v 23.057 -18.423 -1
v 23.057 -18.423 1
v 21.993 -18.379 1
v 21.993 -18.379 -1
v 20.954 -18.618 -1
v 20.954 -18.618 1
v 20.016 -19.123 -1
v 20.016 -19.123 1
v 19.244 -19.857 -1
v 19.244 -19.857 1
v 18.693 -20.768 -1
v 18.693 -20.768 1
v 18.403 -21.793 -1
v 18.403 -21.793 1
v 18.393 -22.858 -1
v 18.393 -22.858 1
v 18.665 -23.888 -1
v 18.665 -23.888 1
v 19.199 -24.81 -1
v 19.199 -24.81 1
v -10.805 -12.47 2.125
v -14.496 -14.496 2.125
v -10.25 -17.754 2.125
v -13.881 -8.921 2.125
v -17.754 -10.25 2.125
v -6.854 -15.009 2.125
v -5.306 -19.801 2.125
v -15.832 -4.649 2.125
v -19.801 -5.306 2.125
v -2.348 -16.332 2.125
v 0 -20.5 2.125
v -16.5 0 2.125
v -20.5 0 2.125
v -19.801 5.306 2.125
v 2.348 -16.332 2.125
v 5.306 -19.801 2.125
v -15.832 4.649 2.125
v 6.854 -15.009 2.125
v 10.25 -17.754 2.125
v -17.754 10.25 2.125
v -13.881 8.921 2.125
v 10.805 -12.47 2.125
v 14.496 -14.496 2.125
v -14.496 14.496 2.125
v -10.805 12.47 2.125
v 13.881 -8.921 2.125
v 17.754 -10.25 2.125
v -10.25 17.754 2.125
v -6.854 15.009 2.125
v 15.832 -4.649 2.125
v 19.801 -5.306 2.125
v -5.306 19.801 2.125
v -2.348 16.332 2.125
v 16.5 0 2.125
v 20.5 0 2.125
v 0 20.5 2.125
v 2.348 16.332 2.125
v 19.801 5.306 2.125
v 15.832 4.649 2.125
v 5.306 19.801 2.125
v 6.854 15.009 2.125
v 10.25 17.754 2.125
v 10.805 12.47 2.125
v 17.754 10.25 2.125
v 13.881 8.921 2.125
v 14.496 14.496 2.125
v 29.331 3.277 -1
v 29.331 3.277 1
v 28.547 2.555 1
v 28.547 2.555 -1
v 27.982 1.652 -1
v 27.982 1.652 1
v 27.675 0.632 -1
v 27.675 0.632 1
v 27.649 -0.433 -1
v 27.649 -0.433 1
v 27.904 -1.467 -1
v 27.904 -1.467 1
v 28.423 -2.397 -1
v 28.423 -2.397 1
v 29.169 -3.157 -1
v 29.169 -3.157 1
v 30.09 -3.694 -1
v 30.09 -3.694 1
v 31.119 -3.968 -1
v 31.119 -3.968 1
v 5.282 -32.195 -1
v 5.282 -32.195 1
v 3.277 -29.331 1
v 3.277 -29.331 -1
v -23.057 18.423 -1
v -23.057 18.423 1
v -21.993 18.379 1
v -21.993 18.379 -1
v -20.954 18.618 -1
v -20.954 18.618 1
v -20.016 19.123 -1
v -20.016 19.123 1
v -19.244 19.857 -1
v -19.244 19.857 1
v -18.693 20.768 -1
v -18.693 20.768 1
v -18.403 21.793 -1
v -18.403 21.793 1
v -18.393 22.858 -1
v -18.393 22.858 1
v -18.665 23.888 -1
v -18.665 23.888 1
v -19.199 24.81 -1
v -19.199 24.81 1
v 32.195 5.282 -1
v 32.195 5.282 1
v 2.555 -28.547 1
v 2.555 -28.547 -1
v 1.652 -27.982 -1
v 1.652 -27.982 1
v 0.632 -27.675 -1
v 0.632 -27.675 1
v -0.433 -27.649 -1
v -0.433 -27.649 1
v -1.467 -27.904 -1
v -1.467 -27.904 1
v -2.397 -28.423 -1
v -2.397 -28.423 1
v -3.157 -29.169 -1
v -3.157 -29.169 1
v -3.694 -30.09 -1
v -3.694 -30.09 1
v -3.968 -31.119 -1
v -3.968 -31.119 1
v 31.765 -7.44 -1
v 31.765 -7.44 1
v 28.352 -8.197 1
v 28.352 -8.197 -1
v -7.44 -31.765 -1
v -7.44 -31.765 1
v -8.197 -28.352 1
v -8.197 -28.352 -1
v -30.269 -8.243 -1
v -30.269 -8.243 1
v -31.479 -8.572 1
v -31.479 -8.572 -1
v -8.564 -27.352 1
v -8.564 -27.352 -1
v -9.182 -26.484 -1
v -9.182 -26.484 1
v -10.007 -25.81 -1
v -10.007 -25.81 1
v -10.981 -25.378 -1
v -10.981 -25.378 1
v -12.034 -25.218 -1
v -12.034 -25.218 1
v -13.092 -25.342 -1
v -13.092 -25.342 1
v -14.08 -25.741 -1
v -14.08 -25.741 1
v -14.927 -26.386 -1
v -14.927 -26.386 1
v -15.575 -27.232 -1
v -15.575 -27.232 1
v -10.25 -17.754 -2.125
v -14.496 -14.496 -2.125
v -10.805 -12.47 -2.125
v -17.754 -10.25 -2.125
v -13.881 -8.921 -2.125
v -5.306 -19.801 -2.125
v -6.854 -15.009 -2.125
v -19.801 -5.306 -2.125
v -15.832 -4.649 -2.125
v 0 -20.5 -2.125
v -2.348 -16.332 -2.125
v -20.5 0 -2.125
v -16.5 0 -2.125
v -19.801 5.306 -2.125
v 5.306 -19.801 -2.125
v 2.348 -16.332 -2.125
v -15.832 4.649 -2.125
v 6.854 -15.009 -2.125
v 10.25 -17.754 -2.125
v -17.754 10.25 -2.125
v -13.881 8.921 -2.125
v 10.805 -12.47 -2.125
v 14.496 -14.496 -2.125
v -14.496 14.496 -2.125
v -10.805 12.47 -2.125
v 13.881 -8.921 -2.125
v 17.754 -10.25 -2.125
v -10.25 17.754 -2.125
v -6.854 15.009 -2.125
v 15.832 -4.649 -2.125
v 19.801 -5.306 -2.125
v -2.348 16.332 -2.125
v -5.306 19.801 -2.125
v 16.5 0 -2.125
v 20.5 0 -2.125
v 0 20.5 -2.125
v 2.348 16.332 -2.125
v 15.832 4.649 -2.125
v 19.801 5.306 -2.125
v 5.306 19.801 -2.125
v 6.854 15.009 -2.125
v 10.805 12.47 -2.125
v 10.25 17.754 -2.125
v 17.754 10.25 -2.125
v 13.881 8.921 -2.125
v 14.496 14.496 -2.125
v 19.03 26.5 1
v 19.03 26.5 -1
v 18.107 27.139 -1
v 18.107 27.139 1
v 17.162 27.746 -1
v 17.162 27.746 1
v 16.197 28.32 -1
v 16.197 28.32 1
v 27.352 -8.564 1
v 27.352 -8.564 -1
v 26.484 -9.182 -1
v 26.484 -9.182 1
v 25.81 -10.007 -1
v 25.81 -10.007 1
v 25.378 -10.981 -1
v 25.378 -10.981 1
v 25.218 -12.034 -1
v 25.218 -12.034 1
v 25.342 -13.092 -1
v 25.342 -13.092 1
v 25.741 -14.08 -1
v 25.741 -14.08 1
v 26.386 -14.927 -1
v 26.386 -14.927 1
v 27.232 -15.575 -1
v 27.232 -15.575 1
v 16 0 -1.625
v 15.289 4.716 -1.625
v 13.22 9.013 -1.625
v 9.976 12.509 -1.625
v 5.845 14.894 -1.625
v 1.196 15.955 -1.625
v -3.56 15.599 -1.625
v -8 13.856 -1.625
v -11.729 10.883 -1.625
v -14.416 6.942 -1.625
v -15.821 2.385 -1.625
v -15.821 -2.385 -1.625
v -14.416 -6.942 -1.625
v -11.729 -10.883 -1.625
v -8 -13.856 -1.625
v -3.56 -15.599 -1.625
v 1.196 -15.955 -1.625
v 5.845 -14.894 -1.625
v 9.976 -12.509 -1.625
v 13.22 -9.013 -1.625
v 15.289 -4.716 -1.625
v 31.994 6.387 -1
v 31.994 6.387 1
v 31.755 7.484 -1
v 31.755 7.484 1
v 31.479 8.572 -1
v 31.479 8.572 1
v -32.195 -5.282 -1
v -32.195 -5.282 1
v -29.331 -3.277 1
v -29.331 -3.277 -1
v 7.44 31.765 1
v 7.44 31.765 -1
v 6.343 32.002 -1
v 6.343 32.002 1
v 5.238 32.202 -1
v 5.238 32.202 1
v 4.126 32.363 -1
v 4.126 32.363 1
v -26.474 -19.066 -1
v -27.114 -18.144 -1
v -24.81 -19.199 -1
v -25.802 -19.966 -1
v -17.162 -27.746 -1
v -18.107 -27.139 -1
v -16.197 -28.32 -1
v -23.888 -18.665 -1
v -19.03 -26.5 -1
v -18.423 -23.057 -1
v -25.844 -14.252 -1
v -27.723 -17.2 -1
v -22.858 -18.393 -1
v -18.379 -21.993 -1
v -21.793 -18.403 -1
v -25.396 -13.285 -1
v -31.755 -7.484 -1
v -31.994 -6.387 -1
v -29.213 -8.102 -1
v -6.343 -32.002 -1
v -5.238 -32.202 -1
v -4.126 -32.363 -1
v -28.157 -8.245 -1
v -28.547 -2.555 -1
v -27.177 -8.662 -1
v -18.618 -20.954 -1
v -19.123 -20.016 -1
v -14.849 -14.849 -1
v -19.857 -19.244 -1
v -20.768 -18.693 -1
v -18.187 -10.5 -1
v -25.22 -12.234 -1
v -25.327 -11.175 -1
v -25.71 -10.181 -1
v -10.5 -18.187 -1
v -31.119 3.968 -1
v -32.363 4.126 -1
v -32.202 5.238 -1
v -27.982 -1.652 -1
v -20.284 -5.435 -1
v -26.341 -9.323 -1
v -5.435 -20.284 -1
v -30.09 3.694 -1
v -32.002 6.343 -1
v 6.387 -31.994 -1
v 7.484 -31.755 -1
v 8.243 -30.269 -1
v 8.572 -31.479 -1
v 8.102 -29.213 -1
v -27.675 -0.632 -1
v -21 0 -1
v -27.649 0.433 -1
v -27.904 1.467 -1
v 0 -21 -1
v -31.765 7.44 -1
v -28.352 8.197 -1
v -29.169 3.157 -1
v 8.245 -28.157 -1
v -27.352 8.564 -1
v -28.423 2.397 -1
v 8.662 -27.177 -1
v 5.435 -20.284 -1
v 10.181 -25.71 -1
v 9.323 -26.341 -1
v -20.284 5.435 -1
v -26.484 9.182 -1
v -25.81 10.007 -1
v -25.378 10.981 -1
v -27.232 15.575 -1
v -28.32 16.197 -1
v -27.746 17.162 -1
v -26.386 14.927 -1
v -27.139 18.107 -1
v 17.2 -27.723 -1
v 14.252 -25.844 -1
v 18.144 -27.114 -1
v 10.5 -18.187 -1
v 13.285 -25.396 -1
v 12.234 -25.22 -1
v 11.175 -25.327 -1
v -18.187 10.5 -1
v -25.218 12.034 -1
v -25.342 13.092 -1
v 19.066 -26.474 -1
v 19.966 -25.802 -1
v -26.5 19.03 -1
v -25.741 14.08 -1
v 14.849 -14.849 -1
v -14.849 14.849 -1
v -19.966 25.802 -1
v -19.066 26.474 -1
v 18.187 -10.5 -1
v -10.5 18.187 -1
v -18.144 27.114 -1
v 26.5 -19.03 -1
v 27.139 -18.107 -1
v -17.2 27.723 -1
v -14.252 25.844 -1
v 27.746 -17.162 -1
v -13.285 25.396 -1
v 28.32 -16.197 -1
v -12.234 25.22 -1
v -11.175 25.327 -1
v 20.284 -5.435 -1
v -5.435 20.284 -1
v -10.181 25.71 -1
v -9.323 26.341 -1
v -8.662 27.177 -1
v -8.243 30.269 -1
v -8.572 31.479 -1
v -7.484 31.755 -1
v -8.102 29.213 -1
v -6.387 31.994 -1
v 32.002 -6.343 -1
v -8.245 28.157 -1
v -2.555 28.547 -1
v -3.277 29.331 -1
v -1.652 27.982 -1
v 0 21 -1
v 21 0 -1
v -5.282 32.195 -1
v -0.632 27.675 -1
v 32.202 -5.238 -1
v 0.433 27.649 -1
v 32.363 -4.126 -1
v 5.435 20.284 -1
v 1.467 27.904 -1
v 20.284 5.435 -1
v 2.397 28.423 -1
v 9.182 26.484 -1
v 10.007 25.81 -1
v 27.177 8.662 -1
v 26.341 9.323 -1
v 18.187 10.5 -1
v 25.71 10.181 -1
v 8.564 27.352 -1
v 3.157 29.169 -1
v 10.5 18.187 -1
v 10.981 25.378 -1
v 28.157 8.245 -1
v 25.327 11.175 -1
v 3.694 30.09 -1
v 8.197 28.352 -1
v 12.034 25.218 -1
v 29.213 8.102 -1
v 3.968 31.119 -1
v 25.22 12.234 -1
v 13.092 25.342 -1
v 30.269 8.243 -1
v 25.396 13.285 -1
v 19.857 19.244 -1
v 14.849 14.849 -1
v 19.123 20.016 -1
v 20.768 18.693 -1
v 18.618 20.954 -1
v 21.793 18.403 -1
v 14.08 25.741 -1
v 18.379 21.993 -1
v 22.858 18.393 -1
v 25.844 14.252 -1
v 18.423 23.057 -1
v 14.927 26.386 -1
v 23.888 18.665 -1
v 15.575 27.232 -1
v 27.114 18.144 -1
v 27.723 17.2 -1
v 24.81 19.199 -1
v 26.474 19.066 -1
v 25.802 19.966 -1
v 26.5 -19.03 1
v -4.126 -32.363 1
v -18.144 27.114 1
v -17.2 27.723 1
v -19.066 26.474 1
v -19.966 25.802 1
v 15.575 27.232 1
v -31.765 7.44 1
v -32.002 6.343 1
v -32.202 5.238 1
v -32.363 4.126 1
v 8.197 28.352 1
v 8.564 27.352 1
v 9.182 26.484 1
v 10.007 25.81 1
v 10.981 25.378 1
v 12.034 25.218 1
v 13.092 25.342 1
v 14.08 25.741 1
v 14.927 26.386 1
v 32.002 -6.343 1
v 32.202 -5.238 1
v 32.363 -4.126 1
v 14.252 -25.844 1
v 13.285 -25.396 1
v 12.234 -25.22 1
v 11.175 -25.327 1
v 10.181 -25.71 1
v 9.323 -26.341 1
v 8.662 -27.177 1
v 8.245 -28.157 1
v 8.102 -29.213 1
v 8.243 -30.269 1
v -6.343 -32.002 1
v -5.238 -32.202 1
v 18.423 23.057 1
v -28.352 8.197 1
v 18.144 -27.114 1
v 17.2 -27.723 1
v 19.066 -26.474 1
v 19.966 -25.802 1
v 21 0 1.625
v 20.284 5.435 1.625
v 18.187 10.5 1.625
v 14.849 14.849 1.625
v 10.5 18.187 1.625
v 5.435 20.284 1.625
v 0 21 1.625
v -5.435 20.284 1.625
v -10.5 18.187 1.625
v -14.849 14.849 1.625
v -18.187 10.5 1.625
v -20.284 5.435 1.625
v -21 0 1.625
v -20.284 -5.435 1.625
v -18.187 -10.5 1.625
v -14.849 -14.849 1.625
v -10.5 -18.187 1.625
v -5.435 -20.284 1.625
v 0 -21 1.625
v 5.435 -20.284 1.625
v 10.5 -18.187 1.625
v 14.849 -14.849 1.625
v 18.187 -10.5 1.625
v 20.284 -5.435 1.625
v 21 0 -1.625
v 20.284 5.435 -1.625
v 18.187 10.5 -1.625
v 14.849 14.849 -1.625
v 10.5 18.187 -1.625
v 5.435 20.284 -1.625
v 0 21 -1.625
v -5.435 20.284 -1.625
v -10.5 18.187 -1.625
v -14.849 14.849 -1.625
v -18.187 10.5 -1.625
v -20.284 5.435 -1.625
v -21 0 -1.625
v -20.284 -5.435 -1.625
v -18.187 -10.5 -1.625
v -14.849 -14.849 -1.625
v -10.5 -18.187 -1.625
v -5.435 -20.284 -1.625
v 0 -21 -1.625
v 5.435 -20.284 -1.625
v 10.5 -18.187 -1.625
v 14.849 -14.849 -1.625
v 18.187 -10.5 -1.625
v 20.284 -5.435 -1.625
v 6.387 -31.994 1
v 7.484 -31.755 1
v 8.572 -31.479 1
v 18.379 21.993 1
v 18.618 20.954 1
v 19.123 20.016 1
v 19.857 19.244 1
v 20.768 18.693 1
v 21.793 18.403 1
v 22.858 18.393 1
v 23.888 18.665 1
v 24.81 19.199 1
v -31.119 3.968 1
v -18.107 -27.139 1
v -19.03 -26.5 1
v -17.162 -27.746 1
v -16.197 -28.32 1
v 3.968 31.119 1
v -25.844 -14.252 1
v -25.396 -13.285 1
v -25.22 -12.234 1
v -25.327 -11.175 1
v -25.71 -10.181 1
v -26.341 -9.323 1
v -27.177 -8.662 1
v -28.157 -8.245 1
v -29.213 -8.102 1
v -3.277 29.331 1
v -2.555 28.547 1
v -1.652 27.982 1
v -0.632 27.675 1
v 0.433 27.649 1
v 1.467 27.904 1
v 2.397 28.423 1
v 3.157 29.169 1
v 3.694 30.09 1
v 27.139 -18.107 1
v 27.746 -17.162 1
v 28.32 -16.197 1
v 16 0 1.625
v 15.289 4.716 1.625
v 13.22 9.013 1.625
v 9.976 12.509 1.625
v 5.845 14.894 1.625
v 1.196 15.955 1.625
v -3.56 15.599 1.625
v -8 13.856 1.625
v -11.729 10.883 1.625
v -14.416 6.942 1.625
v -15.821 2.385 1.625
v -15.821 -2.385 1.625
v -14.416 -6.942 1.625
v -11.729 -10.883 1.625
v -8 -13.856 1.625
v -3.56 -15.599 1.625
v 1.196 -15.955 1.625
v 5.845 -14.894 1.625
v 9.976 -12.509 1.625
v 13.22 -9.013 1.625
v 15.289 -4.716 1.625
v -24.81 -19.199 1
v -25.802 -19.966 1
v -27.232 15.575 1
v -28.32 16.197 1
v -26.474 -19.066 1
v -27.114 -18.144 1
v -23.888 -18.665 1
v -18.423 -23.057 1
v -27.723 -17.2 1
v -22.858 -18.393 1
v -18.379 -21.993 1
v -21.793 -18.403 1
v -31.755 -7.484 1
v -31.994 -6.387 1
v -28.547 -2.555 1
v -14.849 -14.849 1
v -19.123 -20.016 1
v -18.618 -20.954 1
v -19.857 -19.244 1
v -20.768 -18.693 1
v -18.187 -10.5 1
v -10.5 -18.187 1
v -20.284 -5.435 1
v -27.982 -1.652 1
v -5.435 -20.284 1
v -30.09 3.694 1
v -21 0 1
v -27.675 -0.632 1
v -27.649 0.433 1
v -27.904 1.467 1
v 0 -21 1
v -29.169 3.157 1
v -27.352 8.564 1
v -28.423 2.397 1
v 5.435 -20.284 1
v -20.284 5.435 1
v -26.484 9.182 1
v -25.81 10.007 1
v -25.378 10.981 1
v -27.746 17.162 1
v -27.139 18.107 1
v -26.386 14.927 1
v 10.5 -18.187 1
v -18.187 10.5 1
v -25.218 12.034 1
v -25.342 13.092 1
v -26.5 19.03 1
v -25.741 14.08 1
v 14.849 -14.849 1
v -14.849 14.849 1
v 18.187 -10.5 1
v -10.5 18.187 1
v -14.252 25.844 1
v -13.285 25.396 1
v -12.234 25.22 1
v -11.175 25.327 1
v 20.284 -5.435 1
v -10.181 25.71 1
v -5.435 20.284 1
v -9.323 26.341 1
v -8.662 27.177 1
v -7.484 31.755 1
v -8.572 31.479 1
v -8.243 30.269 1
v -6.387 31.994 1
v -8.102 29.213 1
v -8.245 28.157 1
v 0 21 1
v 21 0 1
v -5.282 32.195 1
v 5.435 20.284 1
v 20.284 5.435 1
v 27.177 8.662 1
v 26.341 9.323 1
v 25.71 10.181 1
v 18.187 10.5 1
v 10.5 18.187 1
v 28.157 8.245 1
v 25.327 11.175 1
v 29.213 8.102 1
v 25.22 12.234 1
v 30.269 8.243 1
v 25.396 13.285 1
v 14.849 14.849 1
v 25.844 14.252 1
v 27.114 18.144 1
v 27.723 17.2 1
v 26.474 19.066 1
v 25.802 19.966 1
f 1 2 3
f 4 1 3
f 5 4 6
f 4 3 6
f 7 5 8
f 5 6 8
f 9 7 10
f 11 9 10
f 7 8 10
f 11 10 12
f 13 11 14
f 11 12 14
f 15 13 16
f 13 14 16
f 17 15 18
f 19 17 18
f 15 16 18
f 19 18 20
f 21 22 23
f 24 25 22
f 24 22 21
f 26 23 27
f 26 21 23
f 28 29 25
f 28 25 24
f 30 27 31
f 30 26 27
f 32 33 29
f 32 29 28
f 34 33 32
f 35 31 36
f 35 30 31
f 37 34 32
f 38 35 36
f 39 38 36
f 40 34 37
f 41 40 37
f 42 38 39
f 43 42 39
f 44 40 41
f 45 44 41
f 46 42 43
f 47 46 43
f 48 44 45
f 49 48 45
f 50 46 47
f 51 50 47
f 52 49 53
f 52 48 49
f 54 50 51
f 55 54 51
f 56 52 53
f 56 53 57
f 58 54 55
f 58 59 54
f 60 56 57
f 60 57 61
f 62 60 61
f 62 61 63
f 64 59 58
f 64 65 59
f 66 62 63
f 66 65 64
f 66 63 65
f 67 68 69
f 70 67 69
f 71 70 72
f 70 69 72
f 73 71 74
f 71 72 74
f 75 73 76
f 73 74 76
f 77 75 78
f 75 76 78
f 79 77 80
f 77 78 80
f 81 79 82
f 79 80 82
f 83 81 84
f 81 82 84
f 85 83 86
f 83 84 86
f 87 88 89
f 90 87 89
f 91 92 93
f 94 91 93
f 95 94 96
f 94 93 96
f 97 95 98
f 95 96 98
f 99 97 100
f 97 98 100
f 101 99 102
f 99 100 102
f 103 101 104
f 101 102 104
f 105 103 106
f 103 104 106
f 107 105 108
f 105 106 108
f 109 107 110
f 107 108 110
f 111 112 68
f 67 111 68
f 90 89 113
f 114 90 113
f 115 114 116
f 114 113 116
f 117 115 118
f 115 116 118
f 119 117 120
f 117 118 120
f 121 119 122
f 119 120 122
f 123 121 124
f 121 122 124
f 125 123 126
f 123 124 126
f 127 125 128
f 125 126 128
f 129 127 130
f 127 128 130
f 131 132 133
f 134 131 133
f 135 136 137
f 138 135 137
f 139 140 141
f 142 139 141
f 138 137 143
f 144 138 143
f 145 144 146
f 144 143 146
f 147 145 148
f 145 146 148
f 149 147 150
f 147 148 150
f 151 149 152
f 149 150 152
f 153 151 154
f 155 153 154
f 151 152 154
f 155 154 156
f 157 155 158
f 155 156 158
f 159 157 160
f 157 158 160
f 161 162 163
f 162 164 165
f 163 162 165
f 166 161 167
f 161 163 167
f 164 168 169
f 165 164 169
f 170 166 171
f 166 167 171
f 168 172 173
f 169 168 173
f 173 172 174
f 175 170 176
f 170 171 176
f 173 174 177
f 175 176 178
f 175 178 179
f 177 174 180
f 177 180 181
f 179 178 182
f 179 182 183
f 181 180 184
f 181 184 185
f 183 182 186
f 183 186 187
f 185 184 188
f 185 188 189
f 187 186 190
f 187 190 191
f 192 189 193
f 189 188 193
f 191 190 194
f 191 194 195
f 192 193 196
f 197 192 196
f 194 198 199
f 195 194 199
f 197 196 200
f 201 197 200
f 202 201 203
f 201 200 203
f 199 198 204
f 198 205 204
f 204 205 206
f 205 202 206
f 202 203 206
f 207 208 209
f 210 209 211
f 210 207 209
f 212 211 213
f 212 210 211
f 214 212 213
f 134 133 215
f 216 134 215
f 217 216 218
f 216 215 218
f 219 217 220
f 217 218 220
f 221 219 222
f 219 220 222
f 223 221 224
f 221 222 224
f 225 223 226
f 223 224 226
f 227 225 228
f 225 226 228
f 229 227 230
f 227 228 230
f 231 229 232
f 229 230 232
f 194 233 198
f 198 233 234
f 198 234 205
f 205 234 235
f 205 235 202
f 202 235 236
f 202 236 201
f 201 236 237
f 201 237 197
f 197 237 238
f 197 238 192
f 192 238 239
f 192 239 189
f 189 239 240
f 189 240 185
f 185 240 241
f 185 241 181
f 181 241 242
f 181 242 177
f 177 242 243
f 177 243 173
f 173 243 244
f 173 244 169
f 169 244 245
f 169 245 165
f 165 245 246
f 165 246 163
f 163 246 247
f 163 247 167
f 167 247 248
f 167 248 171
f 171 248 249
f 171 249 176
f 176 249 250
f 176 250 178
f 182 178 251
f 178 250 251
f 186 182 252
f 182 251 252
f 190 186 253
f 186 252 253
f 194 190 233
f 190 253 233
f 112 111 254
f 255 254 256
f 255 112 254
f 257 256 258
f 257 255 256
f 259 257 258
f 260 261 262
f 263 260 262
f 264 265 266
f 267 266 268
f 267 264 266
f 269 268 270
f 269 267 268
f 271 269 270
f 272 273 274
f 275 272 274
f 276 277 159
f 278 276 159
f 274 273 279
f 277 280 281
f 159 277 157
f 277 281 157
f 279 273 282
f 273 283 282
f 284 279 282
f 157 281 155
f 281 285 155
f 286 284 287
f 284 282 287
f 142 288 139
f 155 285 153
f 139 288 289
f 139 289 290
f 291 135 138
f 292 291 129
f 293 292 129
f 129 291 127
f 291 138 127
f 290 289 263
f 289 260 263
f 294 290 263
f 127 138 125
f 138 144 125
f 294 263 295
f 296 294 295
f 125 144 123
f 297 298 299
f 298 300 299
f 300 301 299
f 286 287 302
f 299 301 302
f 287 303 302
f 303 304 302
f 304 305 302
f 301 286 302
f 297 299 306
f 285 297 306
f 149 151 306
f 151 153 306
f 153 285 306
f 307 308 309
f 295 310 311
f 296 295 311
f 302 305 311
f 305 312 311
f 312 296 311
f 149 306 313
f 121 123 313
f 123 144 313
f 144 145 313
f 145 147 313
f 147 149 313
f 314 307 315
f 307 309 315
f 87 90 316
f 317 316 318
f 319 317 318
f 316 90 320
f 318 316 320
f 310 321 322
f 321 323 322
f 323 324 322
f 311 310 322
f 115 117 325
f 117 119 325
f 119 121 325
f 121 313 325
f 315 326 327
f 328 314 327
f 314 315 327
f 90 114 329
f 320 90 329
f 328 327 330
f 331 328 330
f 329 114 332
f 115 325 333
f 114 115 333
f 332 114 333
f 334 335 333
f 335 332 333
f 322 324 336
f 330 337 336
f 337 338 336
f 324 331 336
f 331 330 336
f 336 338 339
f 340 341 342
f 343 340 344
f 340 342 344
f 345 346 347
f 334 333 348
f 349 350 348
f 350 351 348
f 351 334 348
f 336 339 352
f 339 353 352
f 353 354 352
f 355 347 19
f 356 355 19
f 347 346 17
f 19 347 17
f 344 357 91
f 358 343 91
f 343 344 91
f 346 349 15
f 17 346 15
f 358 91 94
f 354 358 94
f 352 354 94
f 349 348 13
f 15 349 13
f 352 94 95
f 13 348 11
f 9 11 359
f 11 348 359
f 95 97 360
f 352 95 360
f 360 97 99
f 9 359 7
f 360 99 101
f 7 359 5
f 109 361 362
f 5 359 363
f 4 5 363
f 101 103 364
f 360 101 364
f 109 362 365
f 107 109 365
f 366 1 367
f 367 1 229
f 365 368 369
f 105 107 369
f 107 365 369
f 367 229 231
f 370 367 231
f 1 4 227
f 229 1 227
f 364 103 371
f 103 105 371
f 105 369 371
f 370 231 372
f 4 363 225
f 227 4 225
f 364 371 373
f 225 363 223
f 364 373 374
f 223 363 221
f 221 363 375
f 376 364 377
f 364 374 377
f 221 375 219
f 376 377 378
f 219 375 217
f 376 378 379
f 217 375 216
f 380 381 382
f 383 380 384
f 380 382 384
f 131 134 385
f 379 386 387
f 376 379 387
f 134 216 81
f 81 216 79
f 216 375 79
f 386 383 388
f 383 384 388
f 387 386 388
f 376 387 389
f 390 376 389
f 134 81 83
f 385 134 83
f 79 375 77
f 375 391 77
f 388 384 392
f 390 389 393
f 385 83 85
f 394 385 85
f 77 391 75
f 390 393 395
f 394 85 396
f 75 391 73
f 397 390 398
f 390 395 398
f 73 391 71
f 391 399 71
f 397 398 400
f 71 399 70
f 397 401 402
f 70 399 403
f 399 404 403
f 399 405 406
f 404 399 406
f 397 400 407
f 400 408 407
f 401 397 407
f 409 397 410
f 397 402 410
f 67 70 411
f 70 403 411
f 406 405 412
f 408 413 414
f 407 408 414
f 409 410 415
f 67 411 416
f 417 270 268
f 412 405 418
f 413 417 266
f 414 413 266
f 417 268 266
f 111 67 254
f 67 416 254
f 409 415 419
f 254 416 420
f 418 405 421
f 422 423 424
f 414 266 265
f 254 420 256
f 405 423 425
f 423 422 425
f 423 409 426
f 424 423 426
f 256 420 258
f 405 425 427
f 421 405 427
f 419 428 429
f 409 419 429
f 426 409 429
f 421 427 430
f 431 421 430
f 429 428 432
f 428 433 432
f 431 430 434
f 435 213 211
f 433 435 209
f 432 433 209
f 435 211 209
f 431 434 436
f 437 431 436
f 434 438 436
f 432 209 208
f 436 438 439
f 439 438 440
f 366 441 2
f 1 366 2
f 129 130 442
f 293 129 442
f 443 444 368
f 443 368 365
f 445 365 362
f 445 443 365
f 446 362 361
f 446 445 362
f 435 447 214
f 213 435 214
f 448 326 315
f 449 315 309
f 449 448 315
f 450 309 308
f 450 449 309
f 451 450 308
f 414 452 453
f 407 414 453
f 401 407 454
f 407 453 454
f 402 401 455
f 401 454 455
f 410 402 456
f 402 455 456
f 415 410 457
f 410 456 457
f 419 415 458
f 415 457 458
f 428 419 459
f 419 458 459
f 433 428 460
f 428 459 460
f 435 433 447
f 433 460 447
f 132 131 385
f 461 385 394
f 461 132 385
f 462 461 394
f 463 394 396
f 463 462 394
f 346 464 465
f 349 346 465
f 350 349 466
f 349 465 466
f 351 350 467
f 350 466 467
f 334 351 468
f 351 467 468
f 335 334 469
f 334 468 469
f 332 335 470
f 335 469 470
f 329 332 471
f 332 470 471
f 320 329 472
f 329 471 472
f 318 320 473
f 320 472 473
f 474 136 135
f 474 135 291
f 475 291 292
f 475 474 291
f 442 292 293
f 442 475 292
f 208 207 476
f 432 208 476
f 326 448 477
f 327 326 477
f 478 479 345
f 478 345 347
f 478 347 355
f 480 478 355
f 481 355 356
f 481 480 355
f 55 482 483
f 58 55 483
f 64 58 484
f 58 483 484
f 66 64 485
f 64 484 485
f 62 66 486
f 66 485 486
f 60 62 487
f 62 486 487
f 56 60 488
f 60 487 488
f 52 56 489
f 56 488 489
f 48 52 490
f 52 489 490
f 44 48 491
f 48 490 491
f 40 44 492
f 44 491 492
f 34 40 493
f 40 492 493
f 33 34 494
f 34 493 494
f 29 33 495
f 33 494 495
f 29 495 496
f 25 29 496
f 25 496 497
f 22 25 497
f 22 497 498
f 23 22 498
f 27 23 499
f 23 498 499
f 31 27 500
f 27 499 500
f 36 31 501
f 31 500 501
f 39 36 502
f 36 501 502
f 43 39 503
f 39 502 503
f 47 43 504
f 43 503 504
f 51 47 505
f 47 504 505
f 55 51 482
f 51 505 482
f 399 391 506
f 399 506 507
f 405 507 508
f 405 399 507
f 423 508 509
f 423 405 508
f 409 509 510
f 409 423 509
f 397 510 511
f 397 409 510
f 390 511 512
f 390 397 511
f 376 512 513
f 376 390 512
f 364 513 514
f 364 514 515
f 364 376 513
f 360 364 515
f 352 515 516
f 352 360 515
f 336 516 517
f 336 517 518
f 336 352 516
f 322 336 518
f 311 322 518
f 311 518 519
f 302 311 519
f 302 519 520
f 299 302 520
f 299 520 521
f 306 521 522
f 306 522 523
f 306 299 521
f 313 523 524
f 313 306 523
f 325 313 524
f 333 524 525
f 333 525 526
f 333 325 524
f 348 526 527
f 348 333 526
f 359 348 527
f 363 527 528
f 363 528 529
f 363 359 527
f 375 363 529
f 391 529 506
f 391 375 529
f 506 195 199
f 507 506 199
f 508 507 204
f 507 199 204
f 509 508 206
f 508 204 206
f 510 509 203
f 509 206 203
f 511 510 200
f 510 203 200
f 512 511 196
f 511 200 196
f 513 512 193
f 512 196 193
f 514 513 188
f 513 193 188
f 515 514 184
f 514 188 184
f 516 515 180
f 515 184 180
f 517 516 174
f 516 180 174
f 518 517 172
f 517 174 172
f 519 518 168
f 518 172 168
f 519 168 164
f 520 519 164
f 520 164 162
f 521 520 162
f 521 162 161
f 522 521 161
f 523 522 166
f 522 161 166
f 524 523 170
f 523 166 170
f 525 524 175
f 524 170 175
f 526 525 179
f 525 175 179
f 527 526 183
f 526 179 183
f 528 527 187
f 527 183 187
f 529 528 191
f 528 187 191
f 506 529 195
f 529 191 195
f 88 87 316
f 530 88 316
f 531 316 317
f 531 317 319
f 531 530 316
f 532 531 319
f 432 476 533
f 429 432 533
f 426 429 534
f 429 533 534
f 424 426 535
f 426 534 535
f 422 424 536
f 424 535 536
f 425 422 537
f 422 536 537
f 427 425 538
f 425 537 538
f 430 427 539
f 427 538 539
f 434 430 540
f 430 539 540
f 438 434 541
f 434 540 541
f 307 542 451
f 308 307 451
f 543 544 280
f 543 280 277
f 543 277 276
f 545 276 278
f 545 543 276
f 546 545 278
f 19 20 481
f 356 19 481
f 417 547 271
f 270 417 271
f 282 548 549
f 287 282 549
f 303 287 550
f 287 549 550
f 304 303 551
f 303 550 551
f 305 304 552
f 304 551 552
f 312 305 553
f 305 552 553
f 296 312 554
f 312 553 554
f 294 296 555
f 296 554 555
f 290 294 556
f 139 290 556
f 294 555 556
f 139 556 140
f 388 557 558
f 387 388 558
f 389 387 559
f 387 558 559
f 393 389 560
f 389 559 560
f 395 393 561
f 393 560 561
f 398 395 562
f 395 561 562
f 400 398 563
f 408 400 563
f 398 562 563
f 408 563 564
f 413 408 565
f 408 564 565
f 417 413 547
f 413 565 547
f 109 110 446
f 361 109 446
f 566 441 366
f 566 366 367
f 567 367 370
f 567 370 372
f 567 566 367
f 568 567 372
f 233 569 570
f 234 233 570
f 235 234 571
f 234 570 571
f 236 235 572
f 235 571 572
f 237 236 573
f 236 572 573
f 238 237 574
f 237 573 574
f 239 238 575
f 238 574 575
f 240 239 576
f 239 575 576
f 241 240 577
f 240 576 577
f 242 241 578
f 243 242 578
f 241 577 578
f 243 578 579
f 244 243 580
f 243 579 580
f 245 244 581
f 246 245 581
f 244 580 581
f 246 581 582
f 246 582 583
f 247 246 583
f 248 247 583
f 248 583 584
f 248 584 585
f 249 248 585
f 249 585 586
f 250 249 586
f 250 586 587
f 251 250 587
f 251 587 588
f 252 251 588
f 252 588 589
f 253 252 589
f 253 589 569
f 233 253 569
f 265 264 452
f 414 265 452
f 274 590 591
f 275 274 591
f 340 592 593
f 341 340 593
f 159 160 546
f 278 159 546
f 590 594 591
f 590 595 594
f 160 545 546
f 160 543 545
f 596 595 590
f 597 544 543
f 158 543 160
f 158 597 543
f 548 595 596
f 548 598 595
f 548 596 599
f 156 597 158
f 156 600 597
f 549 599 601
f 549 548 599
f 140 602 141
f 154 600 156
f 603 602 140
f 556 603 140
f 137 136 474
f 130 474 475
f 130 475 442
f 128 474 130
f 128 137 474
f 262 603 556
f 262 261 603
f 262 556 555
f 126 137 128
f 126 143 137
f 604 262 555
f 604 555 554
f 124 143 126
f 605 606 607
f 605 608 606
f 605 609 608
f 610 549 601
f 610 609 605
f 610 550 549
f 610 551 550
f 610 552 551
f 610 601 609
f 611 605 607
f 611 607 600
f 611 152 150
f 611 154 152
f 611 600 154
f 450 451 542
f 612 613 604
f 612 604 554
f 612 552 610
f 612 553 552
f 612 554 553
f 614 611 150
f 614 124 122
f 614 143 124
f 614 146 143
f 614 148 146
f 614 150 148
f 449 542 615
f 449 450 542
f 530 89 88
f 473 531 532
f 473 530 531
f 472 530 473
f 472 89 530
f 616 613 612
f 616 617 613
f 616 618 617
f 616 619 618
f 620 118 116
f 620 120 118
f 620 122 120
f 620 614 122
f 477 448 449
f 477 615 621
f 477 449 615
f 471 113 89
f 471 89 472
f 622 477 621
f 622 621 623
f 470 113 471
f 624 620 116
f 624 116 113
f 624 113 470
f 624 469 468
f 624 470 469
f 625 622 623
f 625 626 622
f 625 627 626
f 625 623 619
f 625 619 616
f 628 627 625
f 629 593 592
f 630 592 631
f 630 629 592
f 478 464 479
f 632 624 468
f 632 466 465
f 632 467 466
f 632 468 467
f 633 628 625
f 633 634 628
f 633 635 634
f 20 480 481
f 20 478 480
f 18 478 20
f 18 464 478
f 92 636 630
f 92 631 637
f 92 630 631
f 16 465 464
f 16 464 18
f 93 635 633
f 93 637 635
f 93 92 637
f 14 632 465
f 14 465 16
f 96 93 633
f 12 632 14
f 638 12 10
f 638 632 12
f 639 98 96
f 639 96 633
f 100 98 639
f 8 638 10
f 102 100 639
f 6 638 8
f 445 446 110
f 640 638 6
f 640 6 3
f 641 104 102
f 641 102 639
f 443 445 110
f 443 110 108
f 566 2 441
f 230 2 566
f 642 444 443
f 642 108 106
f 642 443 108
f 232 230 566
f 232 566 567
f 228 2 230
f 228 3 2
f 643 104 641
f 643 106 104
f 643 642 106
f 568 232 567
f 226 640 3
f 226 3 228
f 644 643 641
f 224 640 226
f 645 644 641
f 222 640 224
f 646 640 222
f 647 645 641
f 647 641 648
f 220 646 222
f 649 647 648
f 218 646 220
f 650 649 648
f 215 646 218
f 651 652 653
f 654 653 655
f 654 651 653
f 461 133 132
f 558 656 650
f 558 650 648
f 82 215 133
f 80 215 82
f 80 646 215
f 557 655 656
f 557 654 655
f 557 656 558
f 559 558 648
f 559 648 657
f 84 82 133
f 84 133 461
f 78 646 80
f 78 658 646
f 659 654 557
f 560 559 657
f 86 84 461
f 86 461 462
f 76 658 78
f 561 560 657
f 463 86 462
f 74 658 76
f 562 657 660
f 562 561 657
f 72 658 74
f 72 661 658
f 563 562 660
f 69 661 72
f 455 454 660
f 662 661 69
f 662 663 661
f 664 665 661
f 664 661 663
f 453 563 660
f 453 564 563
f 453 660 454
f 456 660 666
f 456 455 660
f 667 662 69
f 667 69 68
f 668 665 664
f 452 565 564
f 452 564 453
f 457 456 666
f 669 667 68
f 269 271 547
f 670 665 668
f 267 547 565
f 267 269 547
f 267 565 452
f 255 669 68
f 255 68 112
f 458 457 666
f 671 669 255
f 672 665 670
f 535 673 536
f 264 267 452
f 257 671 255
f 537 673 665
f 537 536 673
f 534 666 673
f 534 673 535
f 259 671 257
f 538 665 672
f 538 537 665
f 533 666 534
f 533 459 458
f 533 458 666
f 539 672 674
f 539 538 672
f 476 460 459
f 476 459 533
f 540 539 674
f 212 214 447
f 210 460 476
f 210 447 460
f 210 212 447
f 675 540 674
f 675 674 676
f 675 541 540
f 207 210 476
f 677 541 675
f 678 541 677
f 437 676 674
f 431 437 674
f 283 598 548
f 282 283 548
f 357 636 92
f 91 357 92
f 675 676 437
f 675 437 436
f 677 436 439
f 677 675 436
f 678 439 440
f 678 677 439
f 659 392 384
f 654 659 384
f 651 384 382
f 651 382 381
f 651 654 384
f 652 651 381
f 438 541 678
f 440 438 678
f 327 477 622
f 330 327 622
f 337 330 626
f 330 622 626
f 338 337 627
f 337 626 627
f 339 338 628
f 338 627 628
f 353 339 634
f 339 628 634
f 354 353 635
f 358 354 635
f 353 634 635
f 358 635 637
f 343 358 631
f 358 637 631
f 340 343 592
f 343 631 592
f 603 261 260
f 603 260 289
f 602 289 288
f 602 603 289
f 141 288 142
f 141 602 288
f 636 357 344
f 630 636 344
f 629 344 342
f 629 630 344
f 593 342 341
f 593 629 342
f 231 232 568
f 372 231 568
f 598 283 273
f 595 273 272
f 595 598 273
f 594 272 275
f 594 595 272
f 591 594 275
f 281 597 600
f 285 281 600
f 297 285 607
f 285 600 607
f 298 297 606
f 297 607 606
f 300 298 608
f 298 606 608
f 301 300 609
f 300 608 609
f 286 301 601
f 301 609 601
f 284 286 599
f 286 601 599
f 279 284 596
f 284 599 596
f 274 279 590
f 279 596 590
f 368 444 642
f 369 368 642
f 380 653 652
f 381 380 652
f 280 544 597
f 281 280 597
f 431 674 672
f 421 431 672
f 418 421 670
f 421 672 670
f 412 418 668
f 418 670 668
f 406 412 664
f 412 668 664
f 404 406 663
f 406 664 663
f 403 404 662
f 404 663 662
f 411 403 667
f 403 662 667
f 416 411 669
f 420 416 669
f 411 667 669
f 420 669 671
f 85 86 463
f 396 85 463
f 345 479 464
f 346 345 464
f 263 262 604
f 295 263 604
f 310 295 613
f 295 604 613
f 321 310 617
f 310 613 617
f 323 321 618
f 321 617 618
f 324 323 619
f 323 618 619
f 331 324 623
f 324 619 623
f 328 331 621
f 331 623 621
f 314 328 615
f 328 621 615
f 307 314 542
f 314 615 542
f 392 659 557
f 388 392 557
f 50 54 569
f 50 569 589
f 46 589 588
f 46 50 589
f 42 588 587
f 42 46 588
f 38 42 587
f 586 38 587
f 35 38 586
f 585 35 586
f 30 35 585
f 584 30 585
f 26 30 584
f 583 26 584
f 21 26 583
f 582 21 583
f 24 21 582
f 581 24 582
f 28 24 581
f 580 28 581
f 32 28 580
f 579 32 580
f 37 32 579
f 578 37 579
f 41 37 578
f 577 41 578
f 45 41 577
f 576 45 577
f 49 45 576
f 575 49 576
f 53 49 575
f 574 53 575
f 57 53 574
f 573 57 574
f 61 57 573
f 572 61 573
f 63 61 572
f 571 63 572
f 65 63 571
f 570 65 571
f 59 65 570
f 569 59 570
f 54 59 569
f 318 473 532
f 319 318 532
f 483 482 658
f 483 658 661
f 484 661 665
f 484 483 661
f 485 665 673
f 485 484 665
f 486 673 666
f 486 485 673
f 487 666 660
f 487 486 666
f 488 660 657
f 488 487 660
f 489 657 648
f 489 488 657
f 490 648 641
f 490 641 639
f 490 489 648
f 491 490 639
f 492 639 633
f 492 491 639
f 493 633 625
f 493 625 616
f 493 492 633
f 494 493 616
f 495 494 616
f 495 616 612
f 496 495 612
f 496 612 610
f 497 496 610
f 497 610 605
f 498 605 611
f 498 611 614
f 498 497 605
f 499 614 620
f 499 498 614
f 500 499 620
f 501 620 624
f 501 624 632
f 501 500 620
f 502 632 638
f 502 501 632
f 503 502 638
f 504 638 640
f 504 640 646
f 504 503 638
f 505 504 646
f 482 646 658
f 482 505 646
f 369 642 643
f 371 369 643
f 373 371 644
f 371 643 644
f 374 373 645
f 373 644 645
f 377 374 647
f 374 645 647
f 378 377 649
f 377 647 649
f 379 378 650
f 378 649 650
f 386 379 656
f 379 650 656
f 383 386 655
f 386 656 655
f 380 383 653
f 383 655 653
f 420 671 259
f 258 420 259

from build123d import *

# Parameters (mm, degrees)
ESQUISSE1_R                  = 32.625
EXTRUSION1_DEPTH             = 1
ENL_V_MAT_EXTRU_1_DEPTH      = 2
R_P_TITION_CIRCULAIRE1_COUNT = 16
ESQUISSE3_R                  = 21
EXTRUSION2_DEPTH             = 2.125
ESQUISSE4_R                  = 16
ENL_V_MAT_EXTRU_2_DEPTH      = 3.125
ENL_V_MAT_EXTRU_2_DEPTH_BACK = 3.125
CHANFREIN1_SIZE              = 0.5


with BuildPart() as part:
    # Esquisse1 → Extrusion1 (new body, symmetric)
    with BuildSketch(Plane.XY):
        Circle(ESQUISSE1_R)
    extrude(amount=EXTRUSION1_DEPTH, both=True)

    # Esquisse2 → Enlèv. mat.-Extru.1 (cut, symmetric)
    with BuildSketch(Plane.XY):
        with BuildLine():
            Line((-5.281931711, 32.194593062), (-3.276608177, 29.330694255))
            ThreePointArc((-3.276608177, 29.330694255), (0.958663447, 27.741578262), (3.967875501, 31.119071146))
            Line((3.967875501, 31.119071146), (4.126482213, 32.362984559))
            ThreePointArc((4.126482213, 32.362984559), (-0.583827722, 32.619775753), (-5.281931711, 32.194593062))
        make_face()
    enl_v_mat_extru_1 = extrude(amount=ENL_V_MAT_EXTRU_1_DEPTH, both=True, mode=Mode.SUBTRACT)

    # Répétition circulaire1: Enlèv. mat.-Extru.1 ×16 about axis
    r_p_tition_circulaire1_axis = Axis((0, 0, 0), (0, 0, 1))
    for i in range(1, R_P_TITION_CIRCULAIRE1_COUNT):
        add(enl_v_mat_extru_1.rotate(r_p_tition_circulaire1_axis, i * 360 / R_P_TITION_CIRCULAIRE1_COUNT), mode=Mode.SUBTRACT)

    # Esquisse3 → Extrusion2 (add, symmetric)
    with BuildSketch(Plane.XY):
        Circle(ESQUISSE3_R)
    extrude(amount=EXTRUSION2_DEPTH, both=True)

    # Esquisse4 → Enlèv. mat.-Extru.2 (cut, two sides)
    with BuildSketch(Plane.XY) as enl_v_mat_extru_2_sk:
        Circle(ESQUISSE4_R)
    extrude(amount=ENL_V_MAT_EXTRU_2_DEPTH, mode=Mode.SUBTRACT)
    extrude(enl_v_mat_extru_2_sk.sketch, amount=-ENL_V_MAT_EXTRU_2_DEPTH_BACK, mode=Mode.SUBTRACT)

    # Chanfrein1
    chanfrein1_edges = [part.edges().sort_by_distance(p)[0] for p in [
        (-21, 0, -2.125),
        (-21, 0, 2.125),
        (-16, 0, -2.125),
        (-16, 0, 2.125),
    ]]
    chamfer(chanfrein1_edges, length=CHANFREIN1_SIZE)


solid = part.part
